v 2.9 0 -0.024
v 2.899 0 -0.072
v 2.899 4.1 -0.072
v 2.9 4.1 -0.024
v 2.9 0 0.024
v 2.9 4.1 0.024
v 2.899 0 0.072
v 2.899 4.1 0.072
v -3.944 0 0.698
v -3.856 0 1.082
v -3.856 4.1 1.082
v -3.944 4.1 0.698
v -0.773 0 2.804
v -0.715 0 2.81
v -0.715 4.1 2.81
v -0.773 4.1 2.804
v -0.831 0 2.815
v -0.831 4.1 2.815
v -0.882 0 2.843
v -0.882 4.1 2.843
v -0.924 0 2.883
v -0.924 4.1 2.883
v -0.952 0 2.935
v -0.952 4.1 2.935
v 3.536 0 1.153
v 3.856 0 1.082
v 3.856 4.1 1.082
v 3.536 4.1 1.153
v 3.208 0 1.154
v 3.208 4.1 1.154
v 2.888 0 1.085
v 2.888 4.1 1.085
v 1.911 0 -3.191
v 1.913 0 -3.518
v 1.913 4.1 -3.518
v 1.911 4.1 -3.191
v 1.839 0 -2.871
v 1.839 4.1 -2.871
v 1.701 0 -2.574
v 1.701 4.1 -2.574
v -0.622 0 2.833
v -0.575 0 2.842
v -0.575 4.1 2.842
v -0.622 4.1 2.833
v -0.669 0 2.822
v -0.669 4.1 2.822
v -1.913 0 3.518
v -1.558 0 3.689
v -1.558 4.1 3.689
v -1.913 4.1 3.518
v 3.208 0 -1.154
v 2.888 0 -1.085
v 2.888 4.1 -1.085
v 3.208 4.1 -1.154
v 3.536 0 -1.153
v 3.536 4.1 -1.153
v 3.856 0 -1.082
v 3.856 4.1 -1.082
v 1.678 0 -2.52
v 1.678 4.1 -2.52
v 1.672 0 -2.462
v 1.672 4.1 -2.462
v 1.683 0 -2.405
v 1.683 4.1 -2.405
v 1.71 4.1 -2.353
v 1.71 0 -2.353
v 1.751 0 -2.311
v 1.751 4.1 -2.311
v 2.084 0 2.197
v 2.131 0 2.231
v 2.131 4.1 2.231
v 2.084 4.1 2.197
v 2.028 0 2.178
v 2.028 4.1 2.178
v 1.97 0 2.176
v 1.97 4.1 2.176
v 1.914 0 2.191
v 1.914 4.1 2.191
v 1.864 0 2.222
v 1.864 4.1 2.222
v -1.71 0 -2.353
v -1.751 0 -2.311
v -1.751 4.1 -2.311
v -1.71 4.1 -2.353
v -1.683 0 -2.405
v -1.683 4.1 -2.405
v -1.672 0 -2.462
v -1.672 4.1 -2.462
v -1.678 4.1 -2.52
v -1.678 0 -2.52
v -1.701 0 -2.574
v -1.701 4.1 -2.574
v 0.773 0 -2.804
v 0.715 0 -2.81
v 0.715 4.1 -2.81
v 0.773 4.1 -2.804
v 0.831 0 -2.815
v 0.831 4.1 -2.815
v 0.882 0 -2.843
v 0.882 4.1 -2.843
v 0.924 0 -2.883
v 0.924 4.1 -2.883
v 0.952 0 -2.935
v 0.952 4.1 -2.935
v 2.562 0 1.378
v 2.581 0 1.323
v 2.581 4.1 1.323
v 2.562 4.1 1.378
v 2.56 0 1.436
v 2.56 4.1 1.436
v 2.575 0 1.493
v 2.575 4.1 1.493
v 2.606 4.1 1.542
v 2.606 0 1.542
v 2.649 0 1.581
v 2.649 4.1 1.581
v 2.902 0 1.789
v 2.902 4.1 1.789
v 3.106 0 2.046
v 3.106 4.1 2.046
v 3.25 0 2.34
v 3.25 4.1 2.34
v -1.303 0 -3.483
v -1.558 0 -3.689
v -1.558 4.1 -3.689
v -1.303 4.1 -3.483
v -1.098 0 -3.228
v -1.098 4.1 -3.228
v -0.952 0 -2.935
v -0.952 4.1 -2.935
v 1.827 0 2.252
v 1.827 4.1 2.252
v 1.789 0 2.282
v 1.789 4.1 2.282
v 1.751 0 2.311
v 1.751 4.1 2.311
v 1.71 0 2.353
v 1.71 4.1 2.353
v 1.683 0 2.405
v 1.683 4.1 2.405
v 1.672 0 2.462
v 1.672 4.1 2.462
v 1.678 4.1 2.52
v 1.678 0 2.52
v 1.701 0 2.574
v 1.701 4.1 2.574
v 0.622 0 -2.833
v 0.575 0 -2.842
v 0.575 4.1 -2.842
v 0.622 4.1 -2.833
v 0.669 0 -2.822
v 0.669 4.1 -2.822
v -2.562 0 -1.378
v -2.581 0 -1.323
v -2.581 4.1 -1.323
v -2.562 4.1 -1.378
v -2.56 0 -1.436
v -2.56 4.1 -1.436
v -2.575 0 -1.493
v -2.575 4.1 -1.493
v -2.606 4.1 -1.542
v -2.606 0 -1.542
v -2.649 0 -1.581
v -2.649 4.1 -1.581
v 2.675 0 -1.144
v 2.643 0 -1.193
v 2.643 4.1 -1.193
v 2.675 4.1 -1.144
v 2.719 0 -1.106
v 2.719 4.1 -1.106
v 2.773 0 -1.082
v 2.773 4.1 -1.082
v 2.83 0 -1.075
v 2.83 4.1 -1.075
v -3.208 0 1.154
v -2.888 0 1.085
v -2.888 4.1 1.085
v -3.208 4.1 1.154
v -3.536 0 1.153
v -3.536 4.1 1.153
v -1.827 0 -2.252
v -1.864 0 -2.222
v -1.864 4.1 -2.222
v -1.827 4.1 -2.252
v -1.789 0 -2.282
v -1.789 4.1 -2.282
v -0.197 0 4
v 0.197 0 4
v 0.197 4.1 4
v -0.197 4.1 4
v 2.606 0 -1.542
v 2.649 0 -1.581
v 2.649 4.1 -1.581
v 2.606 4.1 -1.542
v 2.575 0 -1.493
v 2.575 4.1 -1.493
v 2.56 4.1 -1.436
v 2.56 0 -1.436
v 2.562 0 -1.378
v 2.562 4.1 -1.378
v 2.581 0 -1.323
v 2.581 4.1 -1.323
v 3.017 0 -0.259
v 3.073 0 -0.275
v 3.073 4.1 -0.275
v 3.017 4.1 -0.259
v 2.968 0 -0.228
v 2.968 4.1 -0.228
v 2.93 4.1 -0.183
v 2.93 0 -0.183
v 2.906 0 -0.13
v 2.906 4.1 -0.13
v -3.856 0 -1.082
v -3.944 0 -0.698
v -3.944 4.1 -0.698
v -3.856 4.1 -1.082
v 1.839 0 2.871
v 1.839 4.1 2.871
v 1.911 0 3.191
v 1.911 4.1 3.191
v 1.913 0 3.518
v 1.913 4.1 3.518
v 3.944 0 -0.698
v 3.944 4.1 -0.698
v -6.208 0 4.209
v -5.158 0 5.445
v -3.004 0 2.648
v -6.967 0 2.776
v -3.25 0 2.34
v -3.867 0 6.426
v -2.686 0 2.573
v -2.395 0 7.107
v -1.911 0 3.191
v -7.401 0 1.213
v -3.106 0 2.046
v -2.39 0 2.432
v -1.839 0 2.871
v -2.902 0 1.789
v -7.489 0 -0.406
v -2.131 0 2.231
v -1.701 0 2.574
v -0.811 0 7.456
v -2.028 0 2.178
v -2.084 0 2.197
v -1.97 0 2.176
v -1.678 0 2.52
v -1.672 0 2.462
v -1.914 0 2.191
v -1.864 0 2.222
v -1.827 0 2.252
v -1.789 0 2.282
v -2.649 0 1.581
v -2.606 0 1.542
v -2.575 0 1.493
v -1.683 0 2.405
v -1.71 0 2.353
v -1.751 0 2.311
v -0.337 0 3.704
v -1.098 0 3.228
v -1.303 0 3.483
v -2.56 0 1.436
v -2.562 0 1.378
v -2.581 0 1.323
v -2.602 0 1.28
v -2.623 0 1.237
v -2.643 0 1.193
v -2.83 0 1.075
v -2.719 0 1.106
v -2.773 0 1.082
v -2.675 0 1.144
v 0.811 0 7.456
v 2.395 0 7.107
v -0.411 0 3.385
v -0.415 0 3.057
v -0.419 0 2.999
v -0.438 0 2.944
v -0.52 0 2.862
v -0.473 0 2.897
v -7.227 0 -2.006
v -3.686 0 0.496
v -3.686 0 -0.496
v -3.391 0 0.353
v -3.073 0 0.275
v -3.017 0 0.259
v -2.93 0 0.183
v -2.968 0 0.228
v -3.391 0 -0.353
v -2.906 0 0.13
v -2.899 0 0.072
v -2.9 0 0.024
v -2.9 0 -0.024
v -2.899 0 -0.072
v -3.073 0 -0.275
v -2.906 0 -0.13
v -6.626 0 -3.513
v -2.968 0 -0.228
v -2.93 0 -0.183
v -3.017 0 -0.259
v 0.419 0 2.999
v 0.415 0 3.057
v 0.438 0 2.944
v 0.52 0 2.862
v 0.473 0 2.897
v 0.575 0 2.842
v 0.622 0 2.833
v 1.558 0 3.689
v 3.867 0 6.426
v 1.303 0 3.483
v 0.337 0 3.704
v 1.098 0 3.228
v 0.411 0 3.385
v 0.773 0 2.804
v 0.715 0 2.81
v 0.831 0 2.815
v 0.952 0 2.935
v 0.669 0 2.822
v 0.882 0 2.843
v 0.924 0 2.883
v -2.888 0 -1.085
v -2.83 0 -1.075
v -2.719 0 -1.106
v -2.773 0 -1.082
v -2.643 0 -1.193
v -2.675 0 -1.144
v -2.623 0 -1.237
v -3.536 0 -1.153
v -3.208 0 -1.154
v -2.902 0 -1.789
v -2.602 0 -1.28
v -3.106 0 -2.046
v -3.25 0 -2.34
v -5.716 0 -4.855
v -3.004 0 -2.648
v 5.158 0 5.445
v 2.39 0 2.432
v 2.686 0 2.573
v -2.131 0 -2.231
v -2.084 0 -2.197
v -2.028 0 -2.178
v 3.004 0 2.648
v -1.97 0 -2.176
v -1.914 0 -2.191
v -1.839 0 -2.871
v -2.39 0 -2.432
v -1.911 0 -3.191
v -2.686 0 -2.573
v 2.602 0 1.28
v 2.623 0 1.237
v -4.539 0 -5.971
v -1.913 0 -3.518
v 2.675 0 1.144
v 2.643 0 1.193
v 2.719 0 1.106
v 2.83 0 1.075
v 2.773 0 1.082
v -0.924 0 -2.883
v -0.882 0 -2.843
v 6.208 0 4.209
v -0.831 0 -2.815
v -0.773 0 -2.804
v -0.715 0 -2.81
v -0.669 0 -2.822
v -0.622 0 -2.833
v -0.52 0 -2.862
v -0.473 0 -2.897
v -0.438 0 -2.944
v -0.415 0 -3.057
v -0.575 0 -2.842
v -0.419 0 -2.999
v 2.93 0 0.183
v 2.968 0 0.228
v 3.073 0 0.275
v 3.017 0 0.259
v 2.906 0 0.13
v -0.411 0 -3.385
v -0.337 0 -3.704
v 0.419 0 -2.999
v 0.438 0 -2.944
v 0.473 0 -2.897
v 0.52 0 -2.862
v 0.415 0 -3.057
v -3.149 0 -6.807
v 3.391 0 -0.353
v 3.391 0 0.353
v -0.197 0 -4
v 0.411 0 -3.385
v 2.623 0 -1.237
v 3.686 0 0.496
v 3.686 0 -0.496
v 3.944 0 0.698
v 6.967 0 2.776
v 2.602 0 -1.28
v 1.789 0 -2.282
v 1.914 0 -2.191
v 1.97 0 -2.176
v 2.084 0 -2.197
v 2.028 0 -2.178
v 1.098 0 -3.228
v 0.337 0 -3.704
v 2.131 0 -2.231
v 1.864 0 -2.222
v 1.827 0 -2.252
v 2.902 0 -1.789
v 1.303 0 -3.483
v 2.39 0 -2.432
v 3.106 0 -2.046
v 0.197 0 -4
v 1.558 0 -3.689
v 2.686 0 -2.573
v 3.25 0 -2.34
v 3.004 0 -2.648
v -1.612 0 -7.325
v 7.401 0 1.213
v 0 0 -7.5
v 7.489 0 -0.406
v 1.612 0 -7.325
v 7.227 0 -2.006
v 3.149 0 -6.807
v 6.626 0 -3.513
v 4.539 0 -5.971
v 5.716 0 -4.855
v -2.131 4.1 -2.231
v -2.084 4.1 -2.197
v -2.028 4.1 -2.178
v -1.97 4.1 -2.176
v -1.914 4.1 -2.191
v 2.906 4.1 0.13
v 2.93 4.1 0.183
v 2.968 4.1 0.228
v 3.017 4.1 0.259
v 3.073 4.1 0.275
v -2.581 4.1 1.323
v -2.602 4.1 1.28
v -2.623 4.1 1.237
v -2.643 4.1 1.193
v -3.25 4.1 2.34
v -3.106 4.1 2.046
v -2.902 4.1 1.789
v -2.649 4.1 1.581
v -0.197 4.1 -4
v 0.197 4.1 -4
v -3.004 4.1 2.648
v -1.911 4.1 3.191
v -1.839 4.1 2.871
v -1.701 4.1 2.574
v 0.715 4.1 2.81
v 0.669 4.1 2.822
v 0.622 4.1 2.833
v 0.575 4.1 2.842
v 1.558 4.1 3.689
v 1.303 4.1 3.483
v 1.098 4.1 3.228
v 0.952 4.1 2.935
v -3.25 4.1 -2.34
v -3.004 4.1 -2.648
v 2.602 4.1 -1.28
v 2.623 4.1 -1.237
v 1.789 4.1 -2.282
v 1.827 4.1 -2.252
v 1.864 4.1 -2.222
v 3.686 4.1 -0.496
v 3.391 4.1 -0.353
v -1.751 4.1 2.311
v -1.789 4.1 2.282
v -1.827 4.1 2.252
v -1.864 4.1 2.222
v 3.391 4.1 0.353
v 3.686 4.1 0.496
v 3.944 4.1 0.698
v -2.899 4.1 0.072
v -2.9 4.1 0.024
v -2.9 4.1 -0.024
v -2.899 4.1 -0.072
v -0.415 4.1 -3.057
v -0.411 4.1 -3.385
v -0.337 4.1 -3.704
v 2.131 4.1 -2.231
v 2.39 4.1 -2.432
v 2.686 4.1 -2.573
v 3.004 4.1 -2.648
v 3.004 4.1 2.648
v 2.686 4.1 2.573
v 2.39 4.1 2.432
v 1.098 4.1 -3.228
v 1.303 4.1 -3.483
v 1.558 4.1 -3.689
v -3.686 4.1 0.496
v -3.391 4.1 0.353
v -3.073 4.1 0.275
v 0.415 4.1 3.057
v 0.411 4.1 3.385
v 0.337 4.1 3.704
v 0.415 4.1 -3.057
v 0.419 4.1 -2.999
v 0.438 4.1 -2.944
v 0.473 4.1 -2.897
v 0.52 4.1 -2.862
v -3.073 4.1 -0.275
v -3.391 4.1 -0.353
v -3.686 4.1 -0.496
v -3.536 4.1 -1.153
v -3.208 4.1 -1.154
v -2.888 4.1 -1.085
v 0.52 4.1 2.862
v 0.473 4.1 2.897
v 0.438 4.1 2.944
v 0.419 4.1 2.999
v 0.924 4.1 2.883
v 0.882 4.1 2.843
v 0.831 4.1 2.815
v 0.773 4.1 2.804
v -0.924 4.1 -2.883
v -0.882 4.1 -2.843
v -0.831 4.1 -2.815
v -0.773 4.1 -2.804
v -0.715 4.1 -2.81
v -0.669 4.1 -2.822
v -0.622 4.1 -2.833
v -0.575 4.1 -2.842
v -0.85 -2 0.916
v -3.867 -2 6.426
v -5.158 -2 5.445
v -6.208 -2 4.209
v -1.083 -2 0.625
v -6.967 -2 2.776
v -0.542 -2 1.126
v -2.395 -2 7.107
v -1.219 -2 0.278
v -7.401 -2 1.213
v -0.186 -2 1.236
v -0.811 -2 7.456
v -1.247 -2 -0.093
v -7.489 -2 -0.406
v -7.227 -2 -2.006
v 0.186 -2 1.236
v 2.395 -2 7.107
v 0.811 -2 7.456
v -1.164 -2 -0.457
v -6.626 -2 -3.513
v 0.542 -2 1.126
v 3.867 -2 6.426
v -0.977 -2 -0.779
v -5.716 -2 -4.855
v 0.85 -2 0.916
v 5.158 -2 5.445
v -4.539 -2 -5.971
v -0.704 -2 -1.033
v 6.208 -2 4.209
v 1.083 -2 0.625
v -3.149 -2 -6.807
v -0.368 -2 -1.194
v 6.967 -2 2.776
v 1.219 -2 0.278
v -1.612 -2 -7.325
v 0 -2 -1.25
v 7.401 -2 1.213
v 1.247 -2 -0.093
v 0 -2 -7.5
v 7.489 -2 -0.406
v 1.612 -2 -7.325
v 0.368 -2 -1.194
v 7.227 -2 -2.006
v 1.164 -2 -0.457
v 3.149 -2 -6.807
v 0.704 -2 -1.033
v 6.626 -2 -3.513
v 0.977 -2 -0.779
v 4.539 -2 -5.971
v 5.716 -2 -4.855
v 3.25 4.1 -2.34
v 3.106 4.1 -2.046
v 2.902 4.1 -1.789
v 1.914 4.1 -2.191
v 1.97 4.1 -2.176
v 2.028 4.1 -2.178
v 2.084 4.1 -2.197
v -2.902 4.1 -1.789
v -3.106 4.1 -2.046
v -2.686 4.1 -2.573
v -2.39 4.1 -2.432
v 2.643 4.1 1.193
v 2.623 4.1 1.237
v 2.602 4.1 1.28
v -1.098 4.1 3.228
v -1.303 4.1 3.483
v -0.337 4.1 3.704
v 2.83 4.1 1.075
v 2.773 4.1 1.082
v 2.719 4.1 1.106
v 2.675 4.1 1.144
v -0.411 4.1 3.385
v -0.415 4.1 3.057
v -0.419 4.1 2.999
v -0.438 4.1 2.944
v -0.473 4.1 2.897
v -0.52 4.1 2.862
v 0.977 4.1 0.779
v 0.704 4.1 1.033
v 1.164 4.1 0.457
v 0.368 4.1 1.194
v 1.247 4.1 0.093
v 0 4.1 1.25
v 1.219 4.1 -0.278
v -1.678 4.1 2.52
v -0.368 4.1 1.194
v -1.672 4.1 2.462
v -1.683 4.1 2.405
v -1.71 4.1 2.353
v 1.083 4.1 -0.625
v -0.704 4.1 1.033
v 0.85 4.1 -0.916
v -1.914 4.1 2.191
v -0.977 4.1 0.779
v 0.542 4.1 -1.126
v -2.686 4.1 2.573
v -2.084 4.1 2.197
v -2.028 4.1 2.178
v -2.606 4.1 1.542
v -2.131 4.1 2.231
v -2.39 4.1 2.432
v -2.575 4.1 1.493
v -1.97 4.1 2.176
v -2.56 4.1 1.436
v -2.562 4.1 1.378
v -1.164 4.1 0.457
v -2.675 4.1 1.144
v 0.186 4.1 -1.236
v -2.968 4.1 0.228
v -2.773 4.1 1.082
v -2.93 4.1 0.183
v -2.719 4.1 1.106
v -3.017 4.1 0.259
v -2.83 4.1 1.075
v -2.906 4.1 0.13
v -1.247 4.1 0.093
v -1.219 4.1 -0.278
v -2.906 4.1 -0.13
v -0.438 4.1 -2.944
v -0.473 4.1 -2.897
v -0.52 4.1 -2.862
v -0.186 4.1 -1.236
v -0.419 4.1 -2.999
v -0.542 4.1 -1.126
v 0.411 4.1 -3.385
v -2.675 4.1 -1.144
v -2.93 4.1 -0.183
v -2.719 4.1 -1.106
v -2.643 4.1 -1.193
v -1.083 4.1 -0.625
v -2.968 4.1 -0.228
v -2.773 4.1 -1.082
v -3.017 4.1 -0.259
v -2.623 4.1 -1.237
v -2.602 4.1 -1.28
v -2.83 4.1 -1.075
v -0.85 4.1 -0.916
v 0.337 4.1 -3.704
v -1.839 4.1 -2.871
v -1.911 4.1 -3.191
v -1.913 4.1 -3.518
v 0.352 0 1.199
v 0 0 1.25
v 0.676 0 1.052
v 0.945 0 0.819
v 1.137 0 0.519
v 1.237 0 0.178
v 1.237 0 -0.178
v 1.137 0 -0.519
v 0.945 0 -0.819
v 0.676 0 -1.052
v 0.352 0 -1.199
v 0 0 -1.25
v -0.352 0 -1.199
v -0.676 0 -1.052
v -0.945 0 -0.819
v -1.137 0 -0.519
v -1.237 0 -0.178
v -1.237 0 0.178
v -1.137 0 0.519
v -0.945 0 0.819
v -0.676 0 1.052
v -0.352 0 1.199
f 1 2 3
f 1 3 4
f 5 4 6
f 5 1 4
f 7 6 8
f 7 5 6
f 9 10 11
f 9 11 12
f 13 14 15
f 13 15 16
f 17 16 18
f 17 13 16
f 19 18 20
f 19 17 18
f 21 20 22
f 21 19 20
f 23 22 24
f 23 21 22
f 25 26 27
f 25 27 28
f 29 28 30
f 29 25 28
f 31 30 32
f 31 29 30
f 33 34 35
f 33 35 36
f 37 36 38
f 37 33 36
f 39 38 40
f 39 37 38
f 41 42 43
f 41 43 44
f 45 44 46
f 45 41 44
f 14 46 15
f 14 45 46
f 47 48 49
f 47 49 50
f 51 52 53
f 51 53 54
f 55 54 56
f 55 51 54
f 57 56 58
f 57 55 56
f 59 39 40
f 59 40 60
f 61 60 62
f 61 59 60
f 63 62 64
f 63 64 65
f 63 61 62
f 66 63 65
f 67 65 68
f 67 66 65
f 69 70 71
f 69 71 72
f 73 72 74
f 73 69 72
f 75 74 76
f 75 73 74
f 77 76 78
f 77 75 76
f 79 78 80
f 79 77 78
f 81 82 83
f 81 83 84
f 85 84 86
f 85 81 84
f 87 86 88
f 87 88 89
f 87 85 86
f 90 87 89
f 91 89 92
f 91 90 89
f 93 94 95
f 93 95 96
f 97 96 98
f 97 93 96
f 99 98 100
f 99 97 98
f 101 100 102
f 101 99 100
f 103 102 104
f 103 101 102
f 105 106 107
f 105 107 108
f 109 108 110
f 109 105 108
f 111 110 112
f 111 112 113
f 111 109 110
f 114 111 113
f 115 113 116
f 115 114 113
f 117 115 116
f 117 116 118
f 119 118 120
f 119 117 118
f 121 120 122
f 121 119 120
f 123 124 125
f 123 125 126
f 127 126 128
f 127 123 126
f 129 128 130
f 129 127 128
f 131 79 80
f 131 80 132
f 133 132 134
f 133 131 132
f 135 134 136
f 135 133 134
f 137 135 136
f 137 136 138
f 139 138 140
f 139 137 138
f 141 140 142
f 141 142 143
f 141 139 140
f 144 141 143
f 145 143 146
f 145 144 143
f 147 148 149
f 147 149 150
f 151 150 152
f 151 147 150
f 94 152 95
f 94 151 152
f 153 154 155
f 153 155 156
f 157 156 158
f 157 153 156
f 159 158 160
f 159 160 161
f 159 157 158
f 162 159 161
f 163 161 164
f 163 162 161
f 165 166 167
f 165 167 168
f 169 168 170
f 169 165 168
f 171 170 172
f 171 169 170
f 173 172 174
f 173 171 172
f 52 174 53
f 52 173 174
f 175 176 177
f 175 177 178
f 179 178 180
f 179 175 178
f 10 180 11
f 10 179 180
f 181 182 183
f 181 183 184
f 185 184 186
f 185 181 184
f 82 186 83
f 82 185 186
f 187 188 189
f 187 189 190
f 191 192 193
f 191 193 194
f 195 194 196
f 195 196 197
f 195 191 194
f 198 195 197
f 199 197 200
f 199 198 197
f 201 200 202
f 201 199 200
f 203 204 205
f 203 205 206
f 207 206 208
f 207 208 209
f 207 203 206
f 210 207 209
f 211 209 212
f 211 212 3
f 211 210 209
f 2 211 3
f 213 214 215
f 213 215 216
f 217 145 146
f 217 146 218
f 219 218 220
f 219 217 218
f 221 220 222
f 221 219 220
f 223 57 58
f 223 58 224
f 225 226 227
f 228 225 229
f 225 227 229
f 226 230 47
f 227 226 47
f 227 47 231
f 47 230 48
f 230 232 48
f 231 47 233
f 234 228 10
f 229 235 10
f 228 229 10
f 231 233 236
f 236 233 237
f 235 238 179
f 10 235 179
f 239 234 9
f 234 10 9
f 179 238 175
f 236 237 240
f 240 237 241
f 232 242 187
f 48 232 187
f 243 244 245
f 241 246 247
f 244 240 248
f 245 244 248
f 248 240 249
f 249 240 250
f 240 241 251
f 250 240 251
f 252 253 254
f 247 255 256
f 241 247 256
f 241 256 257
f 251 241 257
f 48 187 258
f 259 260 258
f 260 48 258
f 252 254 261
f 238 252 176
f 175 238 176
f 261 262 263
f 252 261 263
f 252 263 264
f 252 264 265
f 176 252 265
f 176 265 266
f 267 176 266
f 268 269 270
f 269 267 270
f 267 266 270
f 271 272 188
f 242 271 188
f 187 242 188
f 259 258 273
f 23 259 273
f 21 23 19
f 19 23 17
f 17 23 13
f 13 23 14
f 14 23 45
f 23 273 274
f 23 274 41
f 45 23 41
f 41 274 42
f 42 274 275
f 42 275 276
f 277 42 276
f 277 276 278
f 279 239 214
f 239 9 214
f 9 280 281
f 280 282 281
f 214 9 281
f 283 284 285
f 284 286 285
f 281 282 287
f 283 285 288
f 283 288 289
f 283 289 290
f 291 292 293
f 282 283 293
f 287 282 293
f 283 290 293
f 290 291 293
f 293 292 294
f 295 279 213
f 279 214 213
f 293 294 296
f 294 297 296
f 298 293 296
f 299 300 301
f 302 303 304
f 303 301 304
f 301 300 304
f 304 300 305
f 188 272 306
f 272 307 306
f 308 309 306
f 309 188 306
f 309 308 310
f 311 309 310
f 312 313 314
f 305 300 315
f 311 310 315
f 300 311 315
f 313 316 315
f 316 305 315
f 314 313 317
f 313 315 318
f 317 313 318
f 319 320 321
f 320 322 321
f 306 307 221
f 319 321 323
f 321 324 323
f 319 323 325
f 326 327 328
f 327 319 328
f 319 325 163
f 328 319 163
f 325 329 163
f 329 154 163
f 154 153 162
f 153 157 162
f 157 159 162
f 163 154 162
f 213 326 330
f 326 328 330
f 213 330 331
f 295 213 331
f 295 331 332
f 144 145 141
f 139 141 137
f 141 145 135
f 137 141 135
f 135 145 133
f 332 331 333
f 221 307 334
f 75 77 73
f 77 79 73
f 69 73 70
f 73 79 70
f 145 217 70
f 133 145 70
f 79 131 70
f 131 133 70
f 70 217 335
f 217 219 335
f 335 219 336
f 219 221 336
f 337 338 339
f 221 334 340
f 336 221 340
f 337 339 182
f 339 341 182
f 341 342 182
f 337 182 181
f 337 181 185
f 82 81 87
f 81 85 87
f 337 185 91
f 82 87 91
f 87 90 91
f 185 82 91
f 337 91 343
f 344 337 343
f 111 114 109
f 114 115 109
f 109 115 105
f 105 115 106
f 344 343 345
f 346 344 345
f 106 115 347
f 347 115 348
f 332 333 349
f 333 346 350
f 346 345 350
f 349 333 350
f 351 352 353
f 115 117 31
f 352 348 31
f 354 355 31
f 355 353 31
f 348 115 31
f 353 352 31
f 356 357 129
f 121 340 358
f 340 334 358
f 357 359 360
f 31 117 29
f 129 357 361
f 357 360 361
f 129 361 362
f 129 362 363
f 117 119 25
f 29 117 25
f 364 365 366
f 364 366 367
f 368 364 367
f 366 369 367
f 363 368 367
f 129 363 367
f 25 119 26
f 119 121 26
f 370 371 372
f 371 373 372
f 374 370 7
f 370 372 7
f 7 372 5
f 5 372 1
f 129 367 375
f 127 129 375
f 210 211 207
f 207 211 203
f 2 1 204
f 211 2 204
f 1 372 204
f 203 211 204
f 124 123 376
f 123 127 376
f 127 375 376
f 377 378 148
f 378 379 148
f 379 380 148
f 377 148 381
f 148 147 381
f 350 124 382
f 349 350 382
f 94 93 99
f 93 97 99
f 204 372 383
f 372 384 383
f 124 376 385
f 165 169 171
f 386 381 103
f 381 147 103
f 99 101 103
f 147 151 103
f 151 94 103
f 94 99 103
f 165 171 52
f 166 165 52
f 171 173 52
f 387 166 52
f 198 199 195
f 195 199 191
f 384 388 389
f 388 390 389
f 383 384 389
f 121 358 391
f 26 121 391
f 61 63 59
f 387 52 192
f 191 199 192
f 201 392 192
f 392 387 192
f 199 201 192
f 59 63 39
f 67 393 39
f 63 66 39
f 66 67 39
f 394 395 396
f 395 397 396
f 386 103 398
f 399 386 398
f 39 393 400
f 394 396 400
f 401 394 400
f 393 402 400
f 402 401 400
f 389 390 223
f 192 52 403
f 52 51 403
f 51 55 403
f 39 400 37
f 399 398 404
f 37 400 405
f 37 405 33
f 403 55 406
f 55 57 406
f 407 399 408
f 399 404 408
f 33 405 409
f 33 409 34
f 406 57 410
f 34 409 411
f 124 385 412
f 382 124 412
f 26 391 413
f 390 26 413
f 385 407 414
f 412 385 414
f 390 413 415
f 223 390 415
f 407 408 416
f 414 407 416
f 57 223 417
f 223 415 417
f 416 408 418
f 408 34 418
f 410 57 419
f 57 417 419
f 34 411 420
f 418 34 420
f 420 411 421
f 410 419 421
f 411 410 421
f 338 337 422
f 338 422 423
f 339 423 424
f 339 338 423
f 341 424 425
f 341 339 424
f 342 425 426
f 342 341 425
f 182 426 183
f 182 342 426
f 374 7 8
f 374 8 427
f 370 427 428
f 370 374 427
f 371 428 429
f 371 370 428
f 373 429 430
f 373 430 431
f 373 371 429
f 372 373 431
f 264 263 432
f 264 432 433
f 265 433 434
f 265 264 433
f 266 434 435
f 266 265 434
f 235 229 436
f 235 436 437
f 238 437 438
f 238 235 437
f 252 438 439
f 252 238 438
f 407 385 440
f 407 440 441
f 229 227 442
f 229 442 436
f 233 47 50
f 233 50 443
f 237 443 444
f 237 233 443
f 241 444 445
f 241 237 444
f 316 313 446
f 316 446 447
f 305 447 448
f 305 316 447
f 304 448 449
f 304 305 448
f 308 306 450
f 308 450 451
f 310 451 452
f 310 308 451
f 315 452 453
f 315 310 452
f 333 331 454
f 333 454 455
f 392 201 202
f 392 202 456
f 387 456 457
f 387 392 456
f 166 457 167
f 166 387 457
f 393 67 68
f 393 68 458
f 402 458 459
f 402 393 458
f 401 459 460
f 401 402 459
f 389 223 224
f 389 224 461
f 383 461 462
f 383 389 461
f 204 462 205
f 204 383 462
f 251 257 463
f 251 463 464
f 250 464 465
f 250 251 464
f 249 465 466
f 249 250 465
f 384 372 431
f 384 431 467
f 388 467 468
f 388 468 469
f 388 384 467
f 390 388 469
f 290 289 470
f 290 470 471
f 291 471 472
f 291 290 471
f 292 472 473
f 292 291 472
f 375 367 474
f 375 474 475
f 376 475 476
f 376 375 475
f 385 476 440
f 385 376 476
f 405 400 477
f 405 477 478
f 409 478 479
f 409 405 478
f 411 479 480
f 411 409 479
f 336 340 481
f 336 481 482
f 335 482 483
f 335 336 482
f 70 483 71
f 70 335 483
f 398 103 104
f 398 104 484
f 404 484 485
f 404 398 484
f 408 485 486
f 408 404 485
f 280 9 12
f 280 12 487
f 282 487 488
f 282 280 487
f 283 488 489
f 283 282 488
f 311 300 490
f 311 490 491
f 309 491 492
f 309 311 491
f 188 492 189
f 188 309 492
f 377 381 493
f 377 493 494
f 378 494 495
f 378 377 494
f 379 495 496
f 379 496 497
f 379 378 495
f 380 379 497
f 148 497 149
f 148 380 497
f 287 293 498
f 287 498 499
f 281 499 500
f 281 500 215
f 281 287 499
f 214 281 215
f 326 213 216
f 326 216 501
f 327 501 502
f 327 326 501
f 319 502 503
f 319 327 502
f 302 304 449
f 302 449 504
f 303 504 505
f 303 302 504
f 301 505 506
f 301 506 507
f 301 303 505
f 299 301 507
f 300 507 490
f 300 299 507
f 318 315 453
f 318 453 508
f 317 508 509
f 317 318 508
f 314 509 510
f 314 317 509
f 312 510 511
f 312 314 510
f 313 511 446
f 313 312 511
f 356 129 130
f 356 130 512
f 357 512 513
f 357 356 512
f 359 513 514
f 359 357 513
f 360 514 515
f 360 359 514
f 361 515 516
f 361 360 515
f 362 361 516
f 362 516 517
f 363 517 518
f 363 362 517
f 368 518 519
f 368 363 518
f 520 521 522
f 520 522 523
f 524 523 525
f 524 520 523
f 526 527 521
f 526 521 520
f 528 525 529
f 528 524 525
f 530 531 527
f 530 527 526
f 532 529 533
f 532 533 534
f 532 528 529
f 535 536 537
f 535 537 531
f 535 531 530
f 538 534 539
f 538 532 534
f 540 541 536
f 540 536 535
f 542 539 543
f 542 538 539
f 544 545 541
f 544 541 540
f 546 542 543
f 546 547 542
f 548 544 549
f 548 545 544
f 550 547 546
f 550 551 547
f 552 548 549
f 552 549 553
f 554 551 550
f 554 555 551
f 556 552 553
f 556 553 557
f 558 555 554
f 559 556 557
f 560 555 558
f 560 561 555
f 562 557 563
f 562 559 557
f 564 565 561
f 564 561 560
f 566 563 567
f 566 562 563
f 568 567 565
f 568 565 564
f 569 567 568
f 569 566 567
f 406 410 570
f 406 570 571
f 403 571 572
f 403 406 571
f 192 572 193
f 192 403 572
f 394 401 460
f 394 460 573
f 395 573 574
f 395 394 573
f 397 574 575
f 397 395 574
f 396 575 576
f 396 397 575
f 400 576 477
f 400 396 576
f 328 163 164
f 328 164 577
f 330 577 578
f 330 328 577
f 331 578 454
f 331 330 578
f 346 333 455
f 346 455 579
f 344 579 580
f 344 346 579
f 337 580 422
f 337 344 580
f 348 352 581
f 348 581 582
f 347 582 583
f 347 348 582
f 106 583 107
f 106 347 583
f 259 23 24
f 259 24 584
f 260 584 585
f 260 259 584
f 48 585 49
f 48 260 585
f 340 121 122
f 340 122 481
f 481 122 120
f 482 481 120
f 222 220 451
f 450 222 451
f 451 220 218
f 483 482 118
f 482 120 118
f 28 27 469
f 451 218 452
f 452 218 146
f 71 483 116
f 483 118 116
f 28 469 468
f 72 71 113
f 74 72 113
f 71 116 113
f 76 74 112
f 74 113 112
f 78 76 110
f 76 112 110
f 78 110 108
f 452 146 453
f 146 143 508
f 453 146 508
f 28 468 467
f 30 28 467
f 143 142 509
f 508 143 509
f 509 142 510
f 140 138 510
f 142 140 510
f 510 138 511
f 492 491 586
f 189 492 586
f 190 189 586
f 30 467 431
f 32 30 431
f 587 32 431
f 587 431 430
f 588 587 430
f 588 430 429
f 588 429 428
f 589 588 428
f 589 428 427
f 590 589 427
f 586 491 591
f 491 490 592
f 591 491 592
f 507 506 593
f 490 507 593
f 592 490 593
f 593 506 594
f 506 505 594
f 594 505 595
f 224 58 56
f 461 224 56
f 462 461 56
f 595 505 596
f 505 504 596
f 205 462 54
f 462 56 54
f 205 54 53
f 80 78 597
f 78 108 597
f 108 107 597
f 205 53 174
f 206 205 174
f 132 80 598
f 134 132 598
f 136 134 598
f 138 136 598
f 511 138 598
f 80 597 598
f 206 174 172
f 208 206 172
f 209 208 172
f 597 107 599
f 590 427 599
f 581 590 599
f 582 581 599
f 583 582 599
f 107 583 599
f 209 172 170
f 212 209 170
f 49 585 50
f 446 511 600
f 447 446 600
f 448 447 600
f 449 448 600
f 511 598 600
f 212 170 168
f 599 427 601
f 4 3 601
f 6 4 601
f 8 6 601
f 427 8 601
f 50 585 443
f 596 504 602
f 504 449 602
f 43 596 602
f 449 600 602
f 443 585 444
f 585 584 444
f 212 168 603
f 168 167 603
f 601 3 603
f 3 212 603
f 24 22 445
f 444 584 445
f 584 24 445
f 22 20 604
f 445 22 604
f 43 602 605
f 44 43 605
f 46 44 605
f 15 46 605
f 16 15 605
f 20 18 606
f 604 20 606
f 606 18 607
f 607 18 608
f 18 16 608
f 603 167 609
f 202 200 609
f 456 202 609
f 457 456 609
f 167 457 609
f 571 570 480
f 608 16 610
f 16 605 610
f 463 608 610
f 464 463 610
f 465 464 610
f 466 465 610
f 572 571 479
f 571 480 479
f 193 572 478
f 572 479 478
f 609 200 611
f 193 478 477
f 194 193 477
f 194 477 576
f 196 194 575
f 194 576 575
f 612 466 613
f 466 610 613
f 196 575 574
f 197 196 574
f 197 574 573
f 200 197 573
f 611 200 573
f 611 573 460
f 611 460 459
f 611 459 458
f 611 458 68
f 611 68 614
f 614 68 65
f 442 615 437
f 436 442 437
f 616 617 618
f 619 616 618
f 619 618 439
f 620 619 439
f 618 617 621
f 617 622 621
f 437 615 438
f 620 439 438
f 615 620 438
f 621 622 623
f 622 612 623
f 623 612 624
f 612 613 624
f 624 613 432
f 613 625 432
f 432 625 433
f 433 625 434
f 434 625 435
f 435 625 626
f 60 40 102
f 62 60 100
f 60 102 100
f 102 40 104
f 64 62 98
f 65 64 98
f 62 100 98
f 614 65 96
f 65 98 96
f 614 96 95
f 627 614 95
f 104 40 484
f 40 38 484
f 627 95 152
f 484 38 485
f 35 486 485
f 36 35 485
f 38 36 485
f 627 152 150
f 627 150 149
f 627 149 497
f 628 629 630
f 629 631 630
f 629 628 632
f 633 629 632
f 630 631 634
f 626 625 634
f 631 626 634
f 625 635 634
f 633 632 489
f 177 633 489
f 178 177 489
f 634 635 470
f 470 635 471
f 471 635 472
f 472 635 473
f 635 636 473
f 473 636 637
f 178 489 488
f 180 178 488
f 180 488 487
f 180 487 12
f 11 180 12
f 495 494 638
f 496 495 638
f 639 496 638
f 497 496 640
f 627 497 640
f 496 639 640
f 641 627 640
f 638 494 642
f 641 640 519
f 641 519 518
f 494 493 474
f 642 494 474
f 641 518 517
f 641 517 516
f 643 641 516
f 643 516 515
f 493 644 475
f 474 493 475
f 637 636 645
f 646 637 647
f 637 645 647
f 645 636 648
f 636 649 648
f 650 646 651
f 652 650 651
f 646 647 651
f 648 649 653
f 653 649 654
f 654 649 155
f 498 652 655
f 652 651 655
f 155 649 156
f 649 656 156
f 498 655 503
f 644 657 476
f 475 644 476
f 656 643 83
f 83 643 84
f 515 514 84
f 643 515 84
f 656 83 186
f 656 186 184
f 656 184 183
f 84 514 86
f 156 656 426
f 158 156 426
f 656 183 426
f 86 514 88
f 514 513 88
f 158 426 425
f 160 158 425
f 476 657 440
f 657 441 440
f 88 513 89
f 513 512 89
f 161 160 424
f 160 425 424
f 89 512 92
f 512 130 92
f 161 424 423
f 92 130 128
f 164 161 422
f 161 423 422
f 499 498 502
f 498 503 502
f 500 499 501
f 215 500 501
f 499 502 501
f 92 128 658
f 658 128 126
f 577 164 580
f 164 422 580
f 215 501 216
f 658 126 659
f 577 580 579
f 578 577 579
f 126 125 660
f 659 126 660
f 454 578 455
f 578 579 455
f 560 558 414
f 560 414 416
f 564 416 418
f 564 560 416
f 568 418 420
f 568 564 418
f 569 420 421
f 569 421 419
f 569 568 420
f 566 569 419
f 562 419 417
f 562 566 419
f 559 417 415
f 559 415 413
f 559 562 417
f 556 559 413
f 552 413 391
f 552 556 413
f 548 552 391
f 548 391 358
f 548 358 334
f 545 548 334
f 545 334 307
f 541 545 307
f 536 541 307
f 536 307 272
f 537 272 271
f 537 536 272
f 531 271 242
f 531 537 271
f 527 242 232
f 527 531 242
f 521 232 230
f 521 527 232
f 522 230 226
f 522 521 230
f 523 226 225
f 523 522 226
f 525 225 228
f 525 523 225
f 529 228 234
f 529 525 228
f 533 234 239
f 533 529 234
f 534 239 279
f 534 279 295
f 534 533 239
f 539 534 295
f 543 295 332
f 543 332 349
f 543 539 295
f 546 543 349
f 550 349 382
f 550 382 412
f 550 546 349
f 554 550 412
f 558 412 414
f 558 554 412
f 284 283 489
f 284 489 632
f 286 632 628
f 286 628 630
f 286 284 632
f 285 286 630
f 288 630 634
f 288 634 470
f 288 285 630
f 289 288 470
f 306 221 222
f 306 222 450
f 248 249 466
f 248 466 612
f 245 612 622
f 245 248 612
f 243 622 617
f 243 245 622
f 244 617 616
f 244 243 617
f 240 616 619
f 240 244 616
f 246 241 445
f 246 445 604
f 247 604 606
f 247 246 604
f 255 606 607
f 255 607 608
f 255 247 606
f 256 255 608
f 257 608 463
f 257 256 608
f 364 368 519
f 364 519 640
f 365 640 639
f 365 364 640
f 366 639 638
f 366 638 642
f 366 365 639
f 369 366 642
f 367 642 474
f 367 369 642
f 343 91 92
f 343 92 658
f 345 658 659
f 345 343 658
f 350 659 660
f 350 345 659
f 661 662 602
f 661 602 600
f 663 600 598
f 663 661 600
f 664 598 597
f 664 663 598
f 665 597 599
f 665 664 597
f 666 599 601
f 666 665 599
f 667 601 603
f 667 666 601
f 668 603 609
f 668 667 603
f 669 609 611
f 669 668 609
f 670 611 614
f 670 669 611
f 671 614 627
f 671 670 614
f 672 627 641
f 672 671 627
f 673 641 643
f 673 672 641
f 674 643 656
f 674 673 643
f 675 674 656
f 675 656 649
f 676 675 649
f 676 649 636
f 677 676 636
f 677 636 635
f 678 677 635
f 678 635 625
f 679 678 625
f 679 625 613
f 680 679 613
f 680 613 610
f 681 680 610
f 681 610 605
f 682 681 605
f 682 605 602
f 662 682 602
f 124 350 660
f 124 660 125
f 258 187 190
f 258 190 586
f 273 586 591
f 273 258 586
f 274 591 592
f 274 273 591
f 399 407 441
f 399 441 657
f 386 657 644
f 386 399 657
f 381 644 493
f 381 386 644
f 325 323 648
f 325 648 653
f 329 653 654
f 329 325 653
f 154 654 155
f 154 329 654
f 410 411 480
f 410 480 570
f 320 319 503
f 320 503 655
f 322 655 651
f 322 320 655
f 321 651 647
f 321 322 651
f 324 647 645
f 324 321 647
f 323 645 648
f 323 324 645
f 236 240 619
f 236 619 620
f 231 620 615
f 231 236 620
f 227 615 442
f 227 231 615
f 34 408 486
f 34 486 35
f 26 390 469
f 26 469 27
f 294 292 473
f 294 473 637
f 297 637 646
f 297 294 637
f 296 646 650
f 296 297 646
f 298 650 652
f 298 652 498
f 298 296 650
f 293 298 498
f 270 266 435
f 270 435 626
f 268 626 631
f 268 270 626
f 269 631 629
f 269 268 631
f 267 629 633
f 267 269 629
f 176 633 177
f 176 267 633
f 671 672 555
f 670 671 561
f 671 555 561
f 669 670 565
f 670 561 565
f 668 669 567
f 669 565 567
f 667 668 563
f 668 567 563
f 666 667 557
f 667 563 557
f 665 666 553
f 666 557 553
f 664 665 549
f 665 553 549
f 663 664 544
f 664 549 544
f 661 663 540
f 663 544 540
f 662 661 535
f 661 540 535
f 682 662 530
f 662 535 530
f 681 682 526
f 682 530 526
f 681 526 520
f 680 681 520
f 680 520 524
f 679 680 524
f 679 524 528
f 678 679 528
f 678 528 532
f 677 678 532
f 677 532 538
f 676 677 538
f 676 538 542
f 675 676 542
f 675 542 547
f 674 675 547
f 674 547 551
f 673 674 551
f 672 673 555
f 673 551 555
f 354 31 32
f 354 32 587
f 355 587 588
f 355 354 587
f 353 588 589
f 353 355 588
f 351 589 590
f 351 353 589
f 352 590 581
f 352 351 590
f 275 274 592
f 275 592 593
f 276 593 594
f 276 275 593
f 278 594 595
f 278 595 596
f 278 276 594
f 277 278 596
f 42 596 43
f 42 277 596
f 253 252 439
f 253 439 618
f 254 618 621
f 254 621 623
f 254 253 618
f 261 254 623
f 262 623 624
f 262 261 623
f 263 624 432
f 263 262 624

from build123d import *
from build123d.topology import SkipClean

# Parameters (mm, degrees)
SKETCH1_R           = 1.25
BOSS_EXTRUDE1_DEPTH = 4.1
BOSS_EXTRUDE2_START = 2
SKETCH2_R           = 7.5
SKETCH2_R_2         = 1.25
BOSS_EXTRUDE2_DEPTH = 2


with BuildPart() as part:
    # Sketch1 → Boss-Extrude1 (new body)
    with BuildSketch(Plane(origin=(0, 0, 0), x_dir=(1, 0, 0), z_dir=(0, 1, 0))):
        with BuildLine():
            Line((-0.197, 4), (0.197, 4))
            ThreePointArc((0.197, 4), (0.382537799, 3.546229716), (0.415450248, 3.057099349))
            ThreePointArc((0.415450248, 3.057099349), (0.454038062, 2.919195271), (0.574930224, 2.842438256))
            ThreePointArc((0.574930224, 2.842438256), (0.645310708, 2.827290945), (0.715293505, 2.810401253))
            ThreePointArc((0.715293505, 2.810401253), (0.8575172, 2.82710379), (0.952117956, 2.934608447))
            ThreePointArc((0.952117956, 2.934608447), (1.193996761, 3.361019503), (1.558044089, 3.689350568))
            Line((1.558044089, 3.689350568), (1.913025823, 3.518400375))
            ThreePointArc((1.913025823, 3.518400375), (1.883306057, 3.029065642), (1.700733436, 2.574094232))
            ThreePointArc((1.700733436, 2.574094232), (1.675665518, 2.433104326), (1.751281972, 2.311495502))
            ThreePointArc((1.751281972, 2.311495502), (1.808120425, 2.267311299), (1.863844584, 2.221729814))
            ThreePointArc((1.863844584, 2.221729814), (1.999230665, 2.175069732), (2.131107523, 2.230882351))
            ThreePointArc((2.131107523, 2.230882351), (2.534045619, 2.510118158), (3.004498439, 2.647980009))
            Line((3.004498439, 2.647980009), (3.250153421, 2.339938405))
            ThreePointArc((3.250153421, 2.339938405), (3.011062453, 1.911957968), (2.649165509, 1.581258184))
            ThreePointArc((2.649165509, 1.581258184), (2.565406867, 1.46510723), (2.580770847, 1.322732715))
            ThreePointArc((2.580770847, 1.322732715), (2.612809717, 1.258262843), (2.643238384, 1.193017539))
            ThreePointArc((2.643238384, 1.193017539), (2.744971977, 1.092236438), (2.888005108, 1.085302646))
            ThreePointArc((2.888005108, 1.085302646), (3.372195665, 1.162057126), (3.855875025, 1.082144535))
            Line((3.855875025, 1.082144535), (3.943548273, 0.698022937))
            ThreePointArc((3.943548273, 0.698022937), (3.542441002, 0.41616357), (3.072897863, 0.275234559))
            ThreePointArc((3.072897863, 0.275234559), (2.947037924, 0.206927678), (2.899106405, 0.071986492))
            ThreePointArc((2.899106405, 0.071986492), (2.9, 0), (2.899106405, -0.071986492))
            ThreePointArc((2.899106405, -0.071986492), (2.947037924, -0.206927678), (3.072897863, -0.275234559))
            ThreePointArc((3.072897863, -0.275234559), (3.542441002, -0.41616357), (3.943548273, -0.698022937))
            Line((3.943548273, -0.698022937), (3.855875025, -1.082144535))
            ThreePointArc((3.855875025, -1.082144535), (3.372195665, -1.162057126), (2.888005108, -1.085302646))
            ThreePointArc((2.888005108, -1.085302646), (2.744971977, -1.092236438), (2.643238384, -1.193017539))
            ThreePointArc((2.643238384, -1.193017539), (2.612809717, -1.258262843), (2.580770847, -1.322732715))
            ThreePointArc((2.580770847, -1.322732715), (2.565406867, -1.46510723), (2.649165509, -1.581258184))
            ThreePointArc((2.649165509, -1.581258184), (3.011062453, -1.911957968), (3.250153421, -2.339938405))
            Line((3.250153421, -2.339938405), (3.004498439, -2.647980009))
            ThreePointArc((3.004498439, -2.647980009), (2.534045619, -2.510118158), (2.131107523, -2.230882351))
            ThreePointArc((2.131107523, -2.230882351), (1.999230665, -2.175069732), (1.863844584, -2.221729814))
            ThreePointArc((1.863844584, -2.221729814), (1.808120425, -2.267311299), (1.751281972, -2.311495502))
            ThreePointArc((1.751281972, -2.311495502), (1.675665518, -2.433104326), (1.700733436, -2.574094232))
            ThreePointArc((1.700733436, -2.574094232), (1.883306057, -3.029065642), (1.913025823, -3.518400375))
            Line((1.913025823, -3.518400375), (1.558044089, -3.689350568))
            ThreePointArc((1.558044089, -3.689350568), (1.193996761, -3.361019503), (0.952117956, -2.934608447))
            ThreePointArc((0.952117956, -2.934608447), (0.8575172, -2.82710379), (0.715293505, -2.810401253))
            ThreePointArc((0.715293505, -2.810401253), (0.645310708, -2.827290945), (0.574930224, -2.842438256))
            ThreePointArc((0.574930224, -2.842438256), (0.454038062, -2.919195271), (0.415450248, -3.057099349))
            ThreePointArc((0.415450248, -3.057099349), (0.382537799, -3.546229716), (0.197, -4))
            Line((0.197, -4), (-0.197, -4))
            ThreePointArc((-0.197, -4), (-0.382537799, -3.546229716), (-0.415450248, -3.057099349))
            ThreePointArc((-0.415450248, -3.057099349), (-0.454038062, -2.919195271), (-0.574930224, -2.842438256))
            ThreePointArc((-0.574930224, -2.842438256), (-0.645310708, -2.827290945), (-0.715293505, -2.810401253))
            ThreePointArc((-0.715293505, -2.810401253), (-0.8575172, -2.82710379), (-0.952117956, -2.934608447))
            ThreePointArc((-0.952117956, -2.934608447), (-1.193996761, -3.361019503), (-1.558044089, -3.689350568))
            Line((-1.558044089, -3.689350568), (-1.913025823, -3.518400375))
            ThreePointArc((-1.913025823, -3.518400375), (-1.883306057, -3.029065642), (-1.700733436, -2.574094232))
            ThreePointArc((-1.700733436, -2.574094232), (-1.675665518, -2.433104326), (-1.751281972, -2.311495502))
            ThreePointArc((-1.751281972, -2.311495502), (-1.808120425, -2.267311299), (-1.863844584, -2.221729814))
            ThreePointArc((-1.863844584, -2.221729814), (-1.999230665, -2.175069732), (-2.131107523, -2.230882351))
            ThreePointArc((-2.131107523, -2.230882351), (-2.534045619, -2.510118158), (-3.004498439, -2.647980009))
            Line((-3.004498439, -2.647980009), (-3.250153421, -2.339938405))
            ThreePointArc((-3.250153421, -2.339938405), (-3.011062453, -1.911957968), (-2.649165509, -1.581258184))
            ThreePointArc((-2.649165509, -1.581258184), (-2.565406867, -1.46510723), (-2.580770847, -1.322732715))
            ThreePointArc((-2.580770847, -1.322732715), (-2.612809717, -1.258262843), (-2.643238384, -1.193017539))
            ThreePointArc((-2.643238384, -1.193017539), (-2.744971977, -1.092236438), (-2.888005108, -1.085302646))
            ThreePointArc((-2.888005108, -1.085302646), (-3.372195665, -1.162057126), (-3.855875025, -1.082144535))
            Line((-3.855875025, -1.082144535), (-3.943548273, -0.698022937))
            ThreePointArc((-3.943548273, -0.698022937), (-3.542441002, -0.41616357), (-3.072897863, -0.275234559))
            ThreePointArc((-3.072897863, -0.275234559), (-2.947037924, -0.206927678), (-2.899106405, -0.071986492))
            ThreePointArc((-2.899106405, -0.071986492), (-2.9, 0), (-2.899106405, 0.071986492))
            ThreePointArc((-2.899106405, 0.071986492), (-2.947037924, 0.206927678), (-3.072897863, 0.275234559))
            ThreePointArc((-3.072897863, 0.275234559), (-3.542441002, 0.41616357), (-3.943548273, 0.698022937))
            Line((-3.943548273, 0.698022937), (-3.855875025, 1.082144535))
            ThreePointArc((-3.855875025, 1.082144535), (-3.372195665, 1.162057126), (-2.888005108, 1.085302646))
            ThreePointArc((-2.888005108, 1.085302646), (-2.744971977, 1.092236438), (-2.643238384, 1.193017539))
            ThreePointArc((-2.643238384, 1.193017539), (-2.612809717, 1.258262843), (-2.580770847, 1.322732715))
            ThreePointArc((-2.580770847, 1.322732715), (-2.565406867, 1.46510723), (-2.649165509, 1.581258184))
            ThreePointArc((-2.649165509, 1.581258184), (-3.011062453, 1.911957968), (-3.250153421, 2.339938405))
            Line((-3.250153421, 2.339938405), (-3.004498439, 2.647980009))
            ThreePointArc((-3.004498439, 2.647980009), (-2.534045619, 2.510118158), (-2.131107523, 2.230882351))
            ThreePointArc((-2.131107523, 2.230882351), (-1.999230665, 2.175069732), (-1.863844584, 2.221729814))
            ThreePointArc((-1.863844584, 2.221729814), (-1.808120425, 2.267311299), (-1.751281972, 2.311495502))
            ThreePointArc((-1.751281972, 2.311495502), (-1.675665518, 2.433104326), (-1.700733436, 2.574094232))
            ThreePointArc((-1.700733436, 2.574094232), (-1.883306057, 3.029065642), (-1.913025823, 3.518400375))
            Line((-1.913025823, 3.518400375), (-1.558044089, 3.689350568))
            ThreePointArc((-1.558044089, 3.689350568), (-1.193996761, 3.361019503), (-0.952117956, 2.934608447))
            ThreePointArc((-0.952117956, 2.934608447), (-0.8575172, 2.82710379), (-0.715293505, 2.810401253))
            ThreePointArc((-0.715293505, 2.810401253), (-0.645310708, 2.827290945), (-0.574930224, 2.842438256))
            ThreePointArc((-0.574930224, 2.842438256), (-0.454038062, 2.919195271), (-0.415450248, 3.057099349))
            ThreePointArc((-0.415450248, 3.057099349), (-0.382537799, 3.546229716), (-0.197, 4))
        make_face()
        with Locations(Location((0, 0, 0), (0, 0, 270))):
            Circle(SKETCH1_R, mode=Mode.SUBTRACT)
    extrude(amount=BOSS_EXTRUDE1_DEPTH)

    # Sketch2 → Boss-Extrude2 (add)
    with SkipClean():  # the faces are left unmerged after this step: merging them gives an invalid solid
        with BuildSketch(Plane.XZ.offset(BOSS_EXTRUDE2_START)):
            with Locations(Location((0, 0, 0), (0, 0, 270))):
                Circle(SKETCH2_R)
            with Locations(Location((0, 0, 0), (0, 0, 270))):
                Circle(SKETCH2_R_2, mode=Mode.SUBTRACT)
        extrude(amount=-BOSS_EXTRUDE2_DEPTH)


solid = part.part
